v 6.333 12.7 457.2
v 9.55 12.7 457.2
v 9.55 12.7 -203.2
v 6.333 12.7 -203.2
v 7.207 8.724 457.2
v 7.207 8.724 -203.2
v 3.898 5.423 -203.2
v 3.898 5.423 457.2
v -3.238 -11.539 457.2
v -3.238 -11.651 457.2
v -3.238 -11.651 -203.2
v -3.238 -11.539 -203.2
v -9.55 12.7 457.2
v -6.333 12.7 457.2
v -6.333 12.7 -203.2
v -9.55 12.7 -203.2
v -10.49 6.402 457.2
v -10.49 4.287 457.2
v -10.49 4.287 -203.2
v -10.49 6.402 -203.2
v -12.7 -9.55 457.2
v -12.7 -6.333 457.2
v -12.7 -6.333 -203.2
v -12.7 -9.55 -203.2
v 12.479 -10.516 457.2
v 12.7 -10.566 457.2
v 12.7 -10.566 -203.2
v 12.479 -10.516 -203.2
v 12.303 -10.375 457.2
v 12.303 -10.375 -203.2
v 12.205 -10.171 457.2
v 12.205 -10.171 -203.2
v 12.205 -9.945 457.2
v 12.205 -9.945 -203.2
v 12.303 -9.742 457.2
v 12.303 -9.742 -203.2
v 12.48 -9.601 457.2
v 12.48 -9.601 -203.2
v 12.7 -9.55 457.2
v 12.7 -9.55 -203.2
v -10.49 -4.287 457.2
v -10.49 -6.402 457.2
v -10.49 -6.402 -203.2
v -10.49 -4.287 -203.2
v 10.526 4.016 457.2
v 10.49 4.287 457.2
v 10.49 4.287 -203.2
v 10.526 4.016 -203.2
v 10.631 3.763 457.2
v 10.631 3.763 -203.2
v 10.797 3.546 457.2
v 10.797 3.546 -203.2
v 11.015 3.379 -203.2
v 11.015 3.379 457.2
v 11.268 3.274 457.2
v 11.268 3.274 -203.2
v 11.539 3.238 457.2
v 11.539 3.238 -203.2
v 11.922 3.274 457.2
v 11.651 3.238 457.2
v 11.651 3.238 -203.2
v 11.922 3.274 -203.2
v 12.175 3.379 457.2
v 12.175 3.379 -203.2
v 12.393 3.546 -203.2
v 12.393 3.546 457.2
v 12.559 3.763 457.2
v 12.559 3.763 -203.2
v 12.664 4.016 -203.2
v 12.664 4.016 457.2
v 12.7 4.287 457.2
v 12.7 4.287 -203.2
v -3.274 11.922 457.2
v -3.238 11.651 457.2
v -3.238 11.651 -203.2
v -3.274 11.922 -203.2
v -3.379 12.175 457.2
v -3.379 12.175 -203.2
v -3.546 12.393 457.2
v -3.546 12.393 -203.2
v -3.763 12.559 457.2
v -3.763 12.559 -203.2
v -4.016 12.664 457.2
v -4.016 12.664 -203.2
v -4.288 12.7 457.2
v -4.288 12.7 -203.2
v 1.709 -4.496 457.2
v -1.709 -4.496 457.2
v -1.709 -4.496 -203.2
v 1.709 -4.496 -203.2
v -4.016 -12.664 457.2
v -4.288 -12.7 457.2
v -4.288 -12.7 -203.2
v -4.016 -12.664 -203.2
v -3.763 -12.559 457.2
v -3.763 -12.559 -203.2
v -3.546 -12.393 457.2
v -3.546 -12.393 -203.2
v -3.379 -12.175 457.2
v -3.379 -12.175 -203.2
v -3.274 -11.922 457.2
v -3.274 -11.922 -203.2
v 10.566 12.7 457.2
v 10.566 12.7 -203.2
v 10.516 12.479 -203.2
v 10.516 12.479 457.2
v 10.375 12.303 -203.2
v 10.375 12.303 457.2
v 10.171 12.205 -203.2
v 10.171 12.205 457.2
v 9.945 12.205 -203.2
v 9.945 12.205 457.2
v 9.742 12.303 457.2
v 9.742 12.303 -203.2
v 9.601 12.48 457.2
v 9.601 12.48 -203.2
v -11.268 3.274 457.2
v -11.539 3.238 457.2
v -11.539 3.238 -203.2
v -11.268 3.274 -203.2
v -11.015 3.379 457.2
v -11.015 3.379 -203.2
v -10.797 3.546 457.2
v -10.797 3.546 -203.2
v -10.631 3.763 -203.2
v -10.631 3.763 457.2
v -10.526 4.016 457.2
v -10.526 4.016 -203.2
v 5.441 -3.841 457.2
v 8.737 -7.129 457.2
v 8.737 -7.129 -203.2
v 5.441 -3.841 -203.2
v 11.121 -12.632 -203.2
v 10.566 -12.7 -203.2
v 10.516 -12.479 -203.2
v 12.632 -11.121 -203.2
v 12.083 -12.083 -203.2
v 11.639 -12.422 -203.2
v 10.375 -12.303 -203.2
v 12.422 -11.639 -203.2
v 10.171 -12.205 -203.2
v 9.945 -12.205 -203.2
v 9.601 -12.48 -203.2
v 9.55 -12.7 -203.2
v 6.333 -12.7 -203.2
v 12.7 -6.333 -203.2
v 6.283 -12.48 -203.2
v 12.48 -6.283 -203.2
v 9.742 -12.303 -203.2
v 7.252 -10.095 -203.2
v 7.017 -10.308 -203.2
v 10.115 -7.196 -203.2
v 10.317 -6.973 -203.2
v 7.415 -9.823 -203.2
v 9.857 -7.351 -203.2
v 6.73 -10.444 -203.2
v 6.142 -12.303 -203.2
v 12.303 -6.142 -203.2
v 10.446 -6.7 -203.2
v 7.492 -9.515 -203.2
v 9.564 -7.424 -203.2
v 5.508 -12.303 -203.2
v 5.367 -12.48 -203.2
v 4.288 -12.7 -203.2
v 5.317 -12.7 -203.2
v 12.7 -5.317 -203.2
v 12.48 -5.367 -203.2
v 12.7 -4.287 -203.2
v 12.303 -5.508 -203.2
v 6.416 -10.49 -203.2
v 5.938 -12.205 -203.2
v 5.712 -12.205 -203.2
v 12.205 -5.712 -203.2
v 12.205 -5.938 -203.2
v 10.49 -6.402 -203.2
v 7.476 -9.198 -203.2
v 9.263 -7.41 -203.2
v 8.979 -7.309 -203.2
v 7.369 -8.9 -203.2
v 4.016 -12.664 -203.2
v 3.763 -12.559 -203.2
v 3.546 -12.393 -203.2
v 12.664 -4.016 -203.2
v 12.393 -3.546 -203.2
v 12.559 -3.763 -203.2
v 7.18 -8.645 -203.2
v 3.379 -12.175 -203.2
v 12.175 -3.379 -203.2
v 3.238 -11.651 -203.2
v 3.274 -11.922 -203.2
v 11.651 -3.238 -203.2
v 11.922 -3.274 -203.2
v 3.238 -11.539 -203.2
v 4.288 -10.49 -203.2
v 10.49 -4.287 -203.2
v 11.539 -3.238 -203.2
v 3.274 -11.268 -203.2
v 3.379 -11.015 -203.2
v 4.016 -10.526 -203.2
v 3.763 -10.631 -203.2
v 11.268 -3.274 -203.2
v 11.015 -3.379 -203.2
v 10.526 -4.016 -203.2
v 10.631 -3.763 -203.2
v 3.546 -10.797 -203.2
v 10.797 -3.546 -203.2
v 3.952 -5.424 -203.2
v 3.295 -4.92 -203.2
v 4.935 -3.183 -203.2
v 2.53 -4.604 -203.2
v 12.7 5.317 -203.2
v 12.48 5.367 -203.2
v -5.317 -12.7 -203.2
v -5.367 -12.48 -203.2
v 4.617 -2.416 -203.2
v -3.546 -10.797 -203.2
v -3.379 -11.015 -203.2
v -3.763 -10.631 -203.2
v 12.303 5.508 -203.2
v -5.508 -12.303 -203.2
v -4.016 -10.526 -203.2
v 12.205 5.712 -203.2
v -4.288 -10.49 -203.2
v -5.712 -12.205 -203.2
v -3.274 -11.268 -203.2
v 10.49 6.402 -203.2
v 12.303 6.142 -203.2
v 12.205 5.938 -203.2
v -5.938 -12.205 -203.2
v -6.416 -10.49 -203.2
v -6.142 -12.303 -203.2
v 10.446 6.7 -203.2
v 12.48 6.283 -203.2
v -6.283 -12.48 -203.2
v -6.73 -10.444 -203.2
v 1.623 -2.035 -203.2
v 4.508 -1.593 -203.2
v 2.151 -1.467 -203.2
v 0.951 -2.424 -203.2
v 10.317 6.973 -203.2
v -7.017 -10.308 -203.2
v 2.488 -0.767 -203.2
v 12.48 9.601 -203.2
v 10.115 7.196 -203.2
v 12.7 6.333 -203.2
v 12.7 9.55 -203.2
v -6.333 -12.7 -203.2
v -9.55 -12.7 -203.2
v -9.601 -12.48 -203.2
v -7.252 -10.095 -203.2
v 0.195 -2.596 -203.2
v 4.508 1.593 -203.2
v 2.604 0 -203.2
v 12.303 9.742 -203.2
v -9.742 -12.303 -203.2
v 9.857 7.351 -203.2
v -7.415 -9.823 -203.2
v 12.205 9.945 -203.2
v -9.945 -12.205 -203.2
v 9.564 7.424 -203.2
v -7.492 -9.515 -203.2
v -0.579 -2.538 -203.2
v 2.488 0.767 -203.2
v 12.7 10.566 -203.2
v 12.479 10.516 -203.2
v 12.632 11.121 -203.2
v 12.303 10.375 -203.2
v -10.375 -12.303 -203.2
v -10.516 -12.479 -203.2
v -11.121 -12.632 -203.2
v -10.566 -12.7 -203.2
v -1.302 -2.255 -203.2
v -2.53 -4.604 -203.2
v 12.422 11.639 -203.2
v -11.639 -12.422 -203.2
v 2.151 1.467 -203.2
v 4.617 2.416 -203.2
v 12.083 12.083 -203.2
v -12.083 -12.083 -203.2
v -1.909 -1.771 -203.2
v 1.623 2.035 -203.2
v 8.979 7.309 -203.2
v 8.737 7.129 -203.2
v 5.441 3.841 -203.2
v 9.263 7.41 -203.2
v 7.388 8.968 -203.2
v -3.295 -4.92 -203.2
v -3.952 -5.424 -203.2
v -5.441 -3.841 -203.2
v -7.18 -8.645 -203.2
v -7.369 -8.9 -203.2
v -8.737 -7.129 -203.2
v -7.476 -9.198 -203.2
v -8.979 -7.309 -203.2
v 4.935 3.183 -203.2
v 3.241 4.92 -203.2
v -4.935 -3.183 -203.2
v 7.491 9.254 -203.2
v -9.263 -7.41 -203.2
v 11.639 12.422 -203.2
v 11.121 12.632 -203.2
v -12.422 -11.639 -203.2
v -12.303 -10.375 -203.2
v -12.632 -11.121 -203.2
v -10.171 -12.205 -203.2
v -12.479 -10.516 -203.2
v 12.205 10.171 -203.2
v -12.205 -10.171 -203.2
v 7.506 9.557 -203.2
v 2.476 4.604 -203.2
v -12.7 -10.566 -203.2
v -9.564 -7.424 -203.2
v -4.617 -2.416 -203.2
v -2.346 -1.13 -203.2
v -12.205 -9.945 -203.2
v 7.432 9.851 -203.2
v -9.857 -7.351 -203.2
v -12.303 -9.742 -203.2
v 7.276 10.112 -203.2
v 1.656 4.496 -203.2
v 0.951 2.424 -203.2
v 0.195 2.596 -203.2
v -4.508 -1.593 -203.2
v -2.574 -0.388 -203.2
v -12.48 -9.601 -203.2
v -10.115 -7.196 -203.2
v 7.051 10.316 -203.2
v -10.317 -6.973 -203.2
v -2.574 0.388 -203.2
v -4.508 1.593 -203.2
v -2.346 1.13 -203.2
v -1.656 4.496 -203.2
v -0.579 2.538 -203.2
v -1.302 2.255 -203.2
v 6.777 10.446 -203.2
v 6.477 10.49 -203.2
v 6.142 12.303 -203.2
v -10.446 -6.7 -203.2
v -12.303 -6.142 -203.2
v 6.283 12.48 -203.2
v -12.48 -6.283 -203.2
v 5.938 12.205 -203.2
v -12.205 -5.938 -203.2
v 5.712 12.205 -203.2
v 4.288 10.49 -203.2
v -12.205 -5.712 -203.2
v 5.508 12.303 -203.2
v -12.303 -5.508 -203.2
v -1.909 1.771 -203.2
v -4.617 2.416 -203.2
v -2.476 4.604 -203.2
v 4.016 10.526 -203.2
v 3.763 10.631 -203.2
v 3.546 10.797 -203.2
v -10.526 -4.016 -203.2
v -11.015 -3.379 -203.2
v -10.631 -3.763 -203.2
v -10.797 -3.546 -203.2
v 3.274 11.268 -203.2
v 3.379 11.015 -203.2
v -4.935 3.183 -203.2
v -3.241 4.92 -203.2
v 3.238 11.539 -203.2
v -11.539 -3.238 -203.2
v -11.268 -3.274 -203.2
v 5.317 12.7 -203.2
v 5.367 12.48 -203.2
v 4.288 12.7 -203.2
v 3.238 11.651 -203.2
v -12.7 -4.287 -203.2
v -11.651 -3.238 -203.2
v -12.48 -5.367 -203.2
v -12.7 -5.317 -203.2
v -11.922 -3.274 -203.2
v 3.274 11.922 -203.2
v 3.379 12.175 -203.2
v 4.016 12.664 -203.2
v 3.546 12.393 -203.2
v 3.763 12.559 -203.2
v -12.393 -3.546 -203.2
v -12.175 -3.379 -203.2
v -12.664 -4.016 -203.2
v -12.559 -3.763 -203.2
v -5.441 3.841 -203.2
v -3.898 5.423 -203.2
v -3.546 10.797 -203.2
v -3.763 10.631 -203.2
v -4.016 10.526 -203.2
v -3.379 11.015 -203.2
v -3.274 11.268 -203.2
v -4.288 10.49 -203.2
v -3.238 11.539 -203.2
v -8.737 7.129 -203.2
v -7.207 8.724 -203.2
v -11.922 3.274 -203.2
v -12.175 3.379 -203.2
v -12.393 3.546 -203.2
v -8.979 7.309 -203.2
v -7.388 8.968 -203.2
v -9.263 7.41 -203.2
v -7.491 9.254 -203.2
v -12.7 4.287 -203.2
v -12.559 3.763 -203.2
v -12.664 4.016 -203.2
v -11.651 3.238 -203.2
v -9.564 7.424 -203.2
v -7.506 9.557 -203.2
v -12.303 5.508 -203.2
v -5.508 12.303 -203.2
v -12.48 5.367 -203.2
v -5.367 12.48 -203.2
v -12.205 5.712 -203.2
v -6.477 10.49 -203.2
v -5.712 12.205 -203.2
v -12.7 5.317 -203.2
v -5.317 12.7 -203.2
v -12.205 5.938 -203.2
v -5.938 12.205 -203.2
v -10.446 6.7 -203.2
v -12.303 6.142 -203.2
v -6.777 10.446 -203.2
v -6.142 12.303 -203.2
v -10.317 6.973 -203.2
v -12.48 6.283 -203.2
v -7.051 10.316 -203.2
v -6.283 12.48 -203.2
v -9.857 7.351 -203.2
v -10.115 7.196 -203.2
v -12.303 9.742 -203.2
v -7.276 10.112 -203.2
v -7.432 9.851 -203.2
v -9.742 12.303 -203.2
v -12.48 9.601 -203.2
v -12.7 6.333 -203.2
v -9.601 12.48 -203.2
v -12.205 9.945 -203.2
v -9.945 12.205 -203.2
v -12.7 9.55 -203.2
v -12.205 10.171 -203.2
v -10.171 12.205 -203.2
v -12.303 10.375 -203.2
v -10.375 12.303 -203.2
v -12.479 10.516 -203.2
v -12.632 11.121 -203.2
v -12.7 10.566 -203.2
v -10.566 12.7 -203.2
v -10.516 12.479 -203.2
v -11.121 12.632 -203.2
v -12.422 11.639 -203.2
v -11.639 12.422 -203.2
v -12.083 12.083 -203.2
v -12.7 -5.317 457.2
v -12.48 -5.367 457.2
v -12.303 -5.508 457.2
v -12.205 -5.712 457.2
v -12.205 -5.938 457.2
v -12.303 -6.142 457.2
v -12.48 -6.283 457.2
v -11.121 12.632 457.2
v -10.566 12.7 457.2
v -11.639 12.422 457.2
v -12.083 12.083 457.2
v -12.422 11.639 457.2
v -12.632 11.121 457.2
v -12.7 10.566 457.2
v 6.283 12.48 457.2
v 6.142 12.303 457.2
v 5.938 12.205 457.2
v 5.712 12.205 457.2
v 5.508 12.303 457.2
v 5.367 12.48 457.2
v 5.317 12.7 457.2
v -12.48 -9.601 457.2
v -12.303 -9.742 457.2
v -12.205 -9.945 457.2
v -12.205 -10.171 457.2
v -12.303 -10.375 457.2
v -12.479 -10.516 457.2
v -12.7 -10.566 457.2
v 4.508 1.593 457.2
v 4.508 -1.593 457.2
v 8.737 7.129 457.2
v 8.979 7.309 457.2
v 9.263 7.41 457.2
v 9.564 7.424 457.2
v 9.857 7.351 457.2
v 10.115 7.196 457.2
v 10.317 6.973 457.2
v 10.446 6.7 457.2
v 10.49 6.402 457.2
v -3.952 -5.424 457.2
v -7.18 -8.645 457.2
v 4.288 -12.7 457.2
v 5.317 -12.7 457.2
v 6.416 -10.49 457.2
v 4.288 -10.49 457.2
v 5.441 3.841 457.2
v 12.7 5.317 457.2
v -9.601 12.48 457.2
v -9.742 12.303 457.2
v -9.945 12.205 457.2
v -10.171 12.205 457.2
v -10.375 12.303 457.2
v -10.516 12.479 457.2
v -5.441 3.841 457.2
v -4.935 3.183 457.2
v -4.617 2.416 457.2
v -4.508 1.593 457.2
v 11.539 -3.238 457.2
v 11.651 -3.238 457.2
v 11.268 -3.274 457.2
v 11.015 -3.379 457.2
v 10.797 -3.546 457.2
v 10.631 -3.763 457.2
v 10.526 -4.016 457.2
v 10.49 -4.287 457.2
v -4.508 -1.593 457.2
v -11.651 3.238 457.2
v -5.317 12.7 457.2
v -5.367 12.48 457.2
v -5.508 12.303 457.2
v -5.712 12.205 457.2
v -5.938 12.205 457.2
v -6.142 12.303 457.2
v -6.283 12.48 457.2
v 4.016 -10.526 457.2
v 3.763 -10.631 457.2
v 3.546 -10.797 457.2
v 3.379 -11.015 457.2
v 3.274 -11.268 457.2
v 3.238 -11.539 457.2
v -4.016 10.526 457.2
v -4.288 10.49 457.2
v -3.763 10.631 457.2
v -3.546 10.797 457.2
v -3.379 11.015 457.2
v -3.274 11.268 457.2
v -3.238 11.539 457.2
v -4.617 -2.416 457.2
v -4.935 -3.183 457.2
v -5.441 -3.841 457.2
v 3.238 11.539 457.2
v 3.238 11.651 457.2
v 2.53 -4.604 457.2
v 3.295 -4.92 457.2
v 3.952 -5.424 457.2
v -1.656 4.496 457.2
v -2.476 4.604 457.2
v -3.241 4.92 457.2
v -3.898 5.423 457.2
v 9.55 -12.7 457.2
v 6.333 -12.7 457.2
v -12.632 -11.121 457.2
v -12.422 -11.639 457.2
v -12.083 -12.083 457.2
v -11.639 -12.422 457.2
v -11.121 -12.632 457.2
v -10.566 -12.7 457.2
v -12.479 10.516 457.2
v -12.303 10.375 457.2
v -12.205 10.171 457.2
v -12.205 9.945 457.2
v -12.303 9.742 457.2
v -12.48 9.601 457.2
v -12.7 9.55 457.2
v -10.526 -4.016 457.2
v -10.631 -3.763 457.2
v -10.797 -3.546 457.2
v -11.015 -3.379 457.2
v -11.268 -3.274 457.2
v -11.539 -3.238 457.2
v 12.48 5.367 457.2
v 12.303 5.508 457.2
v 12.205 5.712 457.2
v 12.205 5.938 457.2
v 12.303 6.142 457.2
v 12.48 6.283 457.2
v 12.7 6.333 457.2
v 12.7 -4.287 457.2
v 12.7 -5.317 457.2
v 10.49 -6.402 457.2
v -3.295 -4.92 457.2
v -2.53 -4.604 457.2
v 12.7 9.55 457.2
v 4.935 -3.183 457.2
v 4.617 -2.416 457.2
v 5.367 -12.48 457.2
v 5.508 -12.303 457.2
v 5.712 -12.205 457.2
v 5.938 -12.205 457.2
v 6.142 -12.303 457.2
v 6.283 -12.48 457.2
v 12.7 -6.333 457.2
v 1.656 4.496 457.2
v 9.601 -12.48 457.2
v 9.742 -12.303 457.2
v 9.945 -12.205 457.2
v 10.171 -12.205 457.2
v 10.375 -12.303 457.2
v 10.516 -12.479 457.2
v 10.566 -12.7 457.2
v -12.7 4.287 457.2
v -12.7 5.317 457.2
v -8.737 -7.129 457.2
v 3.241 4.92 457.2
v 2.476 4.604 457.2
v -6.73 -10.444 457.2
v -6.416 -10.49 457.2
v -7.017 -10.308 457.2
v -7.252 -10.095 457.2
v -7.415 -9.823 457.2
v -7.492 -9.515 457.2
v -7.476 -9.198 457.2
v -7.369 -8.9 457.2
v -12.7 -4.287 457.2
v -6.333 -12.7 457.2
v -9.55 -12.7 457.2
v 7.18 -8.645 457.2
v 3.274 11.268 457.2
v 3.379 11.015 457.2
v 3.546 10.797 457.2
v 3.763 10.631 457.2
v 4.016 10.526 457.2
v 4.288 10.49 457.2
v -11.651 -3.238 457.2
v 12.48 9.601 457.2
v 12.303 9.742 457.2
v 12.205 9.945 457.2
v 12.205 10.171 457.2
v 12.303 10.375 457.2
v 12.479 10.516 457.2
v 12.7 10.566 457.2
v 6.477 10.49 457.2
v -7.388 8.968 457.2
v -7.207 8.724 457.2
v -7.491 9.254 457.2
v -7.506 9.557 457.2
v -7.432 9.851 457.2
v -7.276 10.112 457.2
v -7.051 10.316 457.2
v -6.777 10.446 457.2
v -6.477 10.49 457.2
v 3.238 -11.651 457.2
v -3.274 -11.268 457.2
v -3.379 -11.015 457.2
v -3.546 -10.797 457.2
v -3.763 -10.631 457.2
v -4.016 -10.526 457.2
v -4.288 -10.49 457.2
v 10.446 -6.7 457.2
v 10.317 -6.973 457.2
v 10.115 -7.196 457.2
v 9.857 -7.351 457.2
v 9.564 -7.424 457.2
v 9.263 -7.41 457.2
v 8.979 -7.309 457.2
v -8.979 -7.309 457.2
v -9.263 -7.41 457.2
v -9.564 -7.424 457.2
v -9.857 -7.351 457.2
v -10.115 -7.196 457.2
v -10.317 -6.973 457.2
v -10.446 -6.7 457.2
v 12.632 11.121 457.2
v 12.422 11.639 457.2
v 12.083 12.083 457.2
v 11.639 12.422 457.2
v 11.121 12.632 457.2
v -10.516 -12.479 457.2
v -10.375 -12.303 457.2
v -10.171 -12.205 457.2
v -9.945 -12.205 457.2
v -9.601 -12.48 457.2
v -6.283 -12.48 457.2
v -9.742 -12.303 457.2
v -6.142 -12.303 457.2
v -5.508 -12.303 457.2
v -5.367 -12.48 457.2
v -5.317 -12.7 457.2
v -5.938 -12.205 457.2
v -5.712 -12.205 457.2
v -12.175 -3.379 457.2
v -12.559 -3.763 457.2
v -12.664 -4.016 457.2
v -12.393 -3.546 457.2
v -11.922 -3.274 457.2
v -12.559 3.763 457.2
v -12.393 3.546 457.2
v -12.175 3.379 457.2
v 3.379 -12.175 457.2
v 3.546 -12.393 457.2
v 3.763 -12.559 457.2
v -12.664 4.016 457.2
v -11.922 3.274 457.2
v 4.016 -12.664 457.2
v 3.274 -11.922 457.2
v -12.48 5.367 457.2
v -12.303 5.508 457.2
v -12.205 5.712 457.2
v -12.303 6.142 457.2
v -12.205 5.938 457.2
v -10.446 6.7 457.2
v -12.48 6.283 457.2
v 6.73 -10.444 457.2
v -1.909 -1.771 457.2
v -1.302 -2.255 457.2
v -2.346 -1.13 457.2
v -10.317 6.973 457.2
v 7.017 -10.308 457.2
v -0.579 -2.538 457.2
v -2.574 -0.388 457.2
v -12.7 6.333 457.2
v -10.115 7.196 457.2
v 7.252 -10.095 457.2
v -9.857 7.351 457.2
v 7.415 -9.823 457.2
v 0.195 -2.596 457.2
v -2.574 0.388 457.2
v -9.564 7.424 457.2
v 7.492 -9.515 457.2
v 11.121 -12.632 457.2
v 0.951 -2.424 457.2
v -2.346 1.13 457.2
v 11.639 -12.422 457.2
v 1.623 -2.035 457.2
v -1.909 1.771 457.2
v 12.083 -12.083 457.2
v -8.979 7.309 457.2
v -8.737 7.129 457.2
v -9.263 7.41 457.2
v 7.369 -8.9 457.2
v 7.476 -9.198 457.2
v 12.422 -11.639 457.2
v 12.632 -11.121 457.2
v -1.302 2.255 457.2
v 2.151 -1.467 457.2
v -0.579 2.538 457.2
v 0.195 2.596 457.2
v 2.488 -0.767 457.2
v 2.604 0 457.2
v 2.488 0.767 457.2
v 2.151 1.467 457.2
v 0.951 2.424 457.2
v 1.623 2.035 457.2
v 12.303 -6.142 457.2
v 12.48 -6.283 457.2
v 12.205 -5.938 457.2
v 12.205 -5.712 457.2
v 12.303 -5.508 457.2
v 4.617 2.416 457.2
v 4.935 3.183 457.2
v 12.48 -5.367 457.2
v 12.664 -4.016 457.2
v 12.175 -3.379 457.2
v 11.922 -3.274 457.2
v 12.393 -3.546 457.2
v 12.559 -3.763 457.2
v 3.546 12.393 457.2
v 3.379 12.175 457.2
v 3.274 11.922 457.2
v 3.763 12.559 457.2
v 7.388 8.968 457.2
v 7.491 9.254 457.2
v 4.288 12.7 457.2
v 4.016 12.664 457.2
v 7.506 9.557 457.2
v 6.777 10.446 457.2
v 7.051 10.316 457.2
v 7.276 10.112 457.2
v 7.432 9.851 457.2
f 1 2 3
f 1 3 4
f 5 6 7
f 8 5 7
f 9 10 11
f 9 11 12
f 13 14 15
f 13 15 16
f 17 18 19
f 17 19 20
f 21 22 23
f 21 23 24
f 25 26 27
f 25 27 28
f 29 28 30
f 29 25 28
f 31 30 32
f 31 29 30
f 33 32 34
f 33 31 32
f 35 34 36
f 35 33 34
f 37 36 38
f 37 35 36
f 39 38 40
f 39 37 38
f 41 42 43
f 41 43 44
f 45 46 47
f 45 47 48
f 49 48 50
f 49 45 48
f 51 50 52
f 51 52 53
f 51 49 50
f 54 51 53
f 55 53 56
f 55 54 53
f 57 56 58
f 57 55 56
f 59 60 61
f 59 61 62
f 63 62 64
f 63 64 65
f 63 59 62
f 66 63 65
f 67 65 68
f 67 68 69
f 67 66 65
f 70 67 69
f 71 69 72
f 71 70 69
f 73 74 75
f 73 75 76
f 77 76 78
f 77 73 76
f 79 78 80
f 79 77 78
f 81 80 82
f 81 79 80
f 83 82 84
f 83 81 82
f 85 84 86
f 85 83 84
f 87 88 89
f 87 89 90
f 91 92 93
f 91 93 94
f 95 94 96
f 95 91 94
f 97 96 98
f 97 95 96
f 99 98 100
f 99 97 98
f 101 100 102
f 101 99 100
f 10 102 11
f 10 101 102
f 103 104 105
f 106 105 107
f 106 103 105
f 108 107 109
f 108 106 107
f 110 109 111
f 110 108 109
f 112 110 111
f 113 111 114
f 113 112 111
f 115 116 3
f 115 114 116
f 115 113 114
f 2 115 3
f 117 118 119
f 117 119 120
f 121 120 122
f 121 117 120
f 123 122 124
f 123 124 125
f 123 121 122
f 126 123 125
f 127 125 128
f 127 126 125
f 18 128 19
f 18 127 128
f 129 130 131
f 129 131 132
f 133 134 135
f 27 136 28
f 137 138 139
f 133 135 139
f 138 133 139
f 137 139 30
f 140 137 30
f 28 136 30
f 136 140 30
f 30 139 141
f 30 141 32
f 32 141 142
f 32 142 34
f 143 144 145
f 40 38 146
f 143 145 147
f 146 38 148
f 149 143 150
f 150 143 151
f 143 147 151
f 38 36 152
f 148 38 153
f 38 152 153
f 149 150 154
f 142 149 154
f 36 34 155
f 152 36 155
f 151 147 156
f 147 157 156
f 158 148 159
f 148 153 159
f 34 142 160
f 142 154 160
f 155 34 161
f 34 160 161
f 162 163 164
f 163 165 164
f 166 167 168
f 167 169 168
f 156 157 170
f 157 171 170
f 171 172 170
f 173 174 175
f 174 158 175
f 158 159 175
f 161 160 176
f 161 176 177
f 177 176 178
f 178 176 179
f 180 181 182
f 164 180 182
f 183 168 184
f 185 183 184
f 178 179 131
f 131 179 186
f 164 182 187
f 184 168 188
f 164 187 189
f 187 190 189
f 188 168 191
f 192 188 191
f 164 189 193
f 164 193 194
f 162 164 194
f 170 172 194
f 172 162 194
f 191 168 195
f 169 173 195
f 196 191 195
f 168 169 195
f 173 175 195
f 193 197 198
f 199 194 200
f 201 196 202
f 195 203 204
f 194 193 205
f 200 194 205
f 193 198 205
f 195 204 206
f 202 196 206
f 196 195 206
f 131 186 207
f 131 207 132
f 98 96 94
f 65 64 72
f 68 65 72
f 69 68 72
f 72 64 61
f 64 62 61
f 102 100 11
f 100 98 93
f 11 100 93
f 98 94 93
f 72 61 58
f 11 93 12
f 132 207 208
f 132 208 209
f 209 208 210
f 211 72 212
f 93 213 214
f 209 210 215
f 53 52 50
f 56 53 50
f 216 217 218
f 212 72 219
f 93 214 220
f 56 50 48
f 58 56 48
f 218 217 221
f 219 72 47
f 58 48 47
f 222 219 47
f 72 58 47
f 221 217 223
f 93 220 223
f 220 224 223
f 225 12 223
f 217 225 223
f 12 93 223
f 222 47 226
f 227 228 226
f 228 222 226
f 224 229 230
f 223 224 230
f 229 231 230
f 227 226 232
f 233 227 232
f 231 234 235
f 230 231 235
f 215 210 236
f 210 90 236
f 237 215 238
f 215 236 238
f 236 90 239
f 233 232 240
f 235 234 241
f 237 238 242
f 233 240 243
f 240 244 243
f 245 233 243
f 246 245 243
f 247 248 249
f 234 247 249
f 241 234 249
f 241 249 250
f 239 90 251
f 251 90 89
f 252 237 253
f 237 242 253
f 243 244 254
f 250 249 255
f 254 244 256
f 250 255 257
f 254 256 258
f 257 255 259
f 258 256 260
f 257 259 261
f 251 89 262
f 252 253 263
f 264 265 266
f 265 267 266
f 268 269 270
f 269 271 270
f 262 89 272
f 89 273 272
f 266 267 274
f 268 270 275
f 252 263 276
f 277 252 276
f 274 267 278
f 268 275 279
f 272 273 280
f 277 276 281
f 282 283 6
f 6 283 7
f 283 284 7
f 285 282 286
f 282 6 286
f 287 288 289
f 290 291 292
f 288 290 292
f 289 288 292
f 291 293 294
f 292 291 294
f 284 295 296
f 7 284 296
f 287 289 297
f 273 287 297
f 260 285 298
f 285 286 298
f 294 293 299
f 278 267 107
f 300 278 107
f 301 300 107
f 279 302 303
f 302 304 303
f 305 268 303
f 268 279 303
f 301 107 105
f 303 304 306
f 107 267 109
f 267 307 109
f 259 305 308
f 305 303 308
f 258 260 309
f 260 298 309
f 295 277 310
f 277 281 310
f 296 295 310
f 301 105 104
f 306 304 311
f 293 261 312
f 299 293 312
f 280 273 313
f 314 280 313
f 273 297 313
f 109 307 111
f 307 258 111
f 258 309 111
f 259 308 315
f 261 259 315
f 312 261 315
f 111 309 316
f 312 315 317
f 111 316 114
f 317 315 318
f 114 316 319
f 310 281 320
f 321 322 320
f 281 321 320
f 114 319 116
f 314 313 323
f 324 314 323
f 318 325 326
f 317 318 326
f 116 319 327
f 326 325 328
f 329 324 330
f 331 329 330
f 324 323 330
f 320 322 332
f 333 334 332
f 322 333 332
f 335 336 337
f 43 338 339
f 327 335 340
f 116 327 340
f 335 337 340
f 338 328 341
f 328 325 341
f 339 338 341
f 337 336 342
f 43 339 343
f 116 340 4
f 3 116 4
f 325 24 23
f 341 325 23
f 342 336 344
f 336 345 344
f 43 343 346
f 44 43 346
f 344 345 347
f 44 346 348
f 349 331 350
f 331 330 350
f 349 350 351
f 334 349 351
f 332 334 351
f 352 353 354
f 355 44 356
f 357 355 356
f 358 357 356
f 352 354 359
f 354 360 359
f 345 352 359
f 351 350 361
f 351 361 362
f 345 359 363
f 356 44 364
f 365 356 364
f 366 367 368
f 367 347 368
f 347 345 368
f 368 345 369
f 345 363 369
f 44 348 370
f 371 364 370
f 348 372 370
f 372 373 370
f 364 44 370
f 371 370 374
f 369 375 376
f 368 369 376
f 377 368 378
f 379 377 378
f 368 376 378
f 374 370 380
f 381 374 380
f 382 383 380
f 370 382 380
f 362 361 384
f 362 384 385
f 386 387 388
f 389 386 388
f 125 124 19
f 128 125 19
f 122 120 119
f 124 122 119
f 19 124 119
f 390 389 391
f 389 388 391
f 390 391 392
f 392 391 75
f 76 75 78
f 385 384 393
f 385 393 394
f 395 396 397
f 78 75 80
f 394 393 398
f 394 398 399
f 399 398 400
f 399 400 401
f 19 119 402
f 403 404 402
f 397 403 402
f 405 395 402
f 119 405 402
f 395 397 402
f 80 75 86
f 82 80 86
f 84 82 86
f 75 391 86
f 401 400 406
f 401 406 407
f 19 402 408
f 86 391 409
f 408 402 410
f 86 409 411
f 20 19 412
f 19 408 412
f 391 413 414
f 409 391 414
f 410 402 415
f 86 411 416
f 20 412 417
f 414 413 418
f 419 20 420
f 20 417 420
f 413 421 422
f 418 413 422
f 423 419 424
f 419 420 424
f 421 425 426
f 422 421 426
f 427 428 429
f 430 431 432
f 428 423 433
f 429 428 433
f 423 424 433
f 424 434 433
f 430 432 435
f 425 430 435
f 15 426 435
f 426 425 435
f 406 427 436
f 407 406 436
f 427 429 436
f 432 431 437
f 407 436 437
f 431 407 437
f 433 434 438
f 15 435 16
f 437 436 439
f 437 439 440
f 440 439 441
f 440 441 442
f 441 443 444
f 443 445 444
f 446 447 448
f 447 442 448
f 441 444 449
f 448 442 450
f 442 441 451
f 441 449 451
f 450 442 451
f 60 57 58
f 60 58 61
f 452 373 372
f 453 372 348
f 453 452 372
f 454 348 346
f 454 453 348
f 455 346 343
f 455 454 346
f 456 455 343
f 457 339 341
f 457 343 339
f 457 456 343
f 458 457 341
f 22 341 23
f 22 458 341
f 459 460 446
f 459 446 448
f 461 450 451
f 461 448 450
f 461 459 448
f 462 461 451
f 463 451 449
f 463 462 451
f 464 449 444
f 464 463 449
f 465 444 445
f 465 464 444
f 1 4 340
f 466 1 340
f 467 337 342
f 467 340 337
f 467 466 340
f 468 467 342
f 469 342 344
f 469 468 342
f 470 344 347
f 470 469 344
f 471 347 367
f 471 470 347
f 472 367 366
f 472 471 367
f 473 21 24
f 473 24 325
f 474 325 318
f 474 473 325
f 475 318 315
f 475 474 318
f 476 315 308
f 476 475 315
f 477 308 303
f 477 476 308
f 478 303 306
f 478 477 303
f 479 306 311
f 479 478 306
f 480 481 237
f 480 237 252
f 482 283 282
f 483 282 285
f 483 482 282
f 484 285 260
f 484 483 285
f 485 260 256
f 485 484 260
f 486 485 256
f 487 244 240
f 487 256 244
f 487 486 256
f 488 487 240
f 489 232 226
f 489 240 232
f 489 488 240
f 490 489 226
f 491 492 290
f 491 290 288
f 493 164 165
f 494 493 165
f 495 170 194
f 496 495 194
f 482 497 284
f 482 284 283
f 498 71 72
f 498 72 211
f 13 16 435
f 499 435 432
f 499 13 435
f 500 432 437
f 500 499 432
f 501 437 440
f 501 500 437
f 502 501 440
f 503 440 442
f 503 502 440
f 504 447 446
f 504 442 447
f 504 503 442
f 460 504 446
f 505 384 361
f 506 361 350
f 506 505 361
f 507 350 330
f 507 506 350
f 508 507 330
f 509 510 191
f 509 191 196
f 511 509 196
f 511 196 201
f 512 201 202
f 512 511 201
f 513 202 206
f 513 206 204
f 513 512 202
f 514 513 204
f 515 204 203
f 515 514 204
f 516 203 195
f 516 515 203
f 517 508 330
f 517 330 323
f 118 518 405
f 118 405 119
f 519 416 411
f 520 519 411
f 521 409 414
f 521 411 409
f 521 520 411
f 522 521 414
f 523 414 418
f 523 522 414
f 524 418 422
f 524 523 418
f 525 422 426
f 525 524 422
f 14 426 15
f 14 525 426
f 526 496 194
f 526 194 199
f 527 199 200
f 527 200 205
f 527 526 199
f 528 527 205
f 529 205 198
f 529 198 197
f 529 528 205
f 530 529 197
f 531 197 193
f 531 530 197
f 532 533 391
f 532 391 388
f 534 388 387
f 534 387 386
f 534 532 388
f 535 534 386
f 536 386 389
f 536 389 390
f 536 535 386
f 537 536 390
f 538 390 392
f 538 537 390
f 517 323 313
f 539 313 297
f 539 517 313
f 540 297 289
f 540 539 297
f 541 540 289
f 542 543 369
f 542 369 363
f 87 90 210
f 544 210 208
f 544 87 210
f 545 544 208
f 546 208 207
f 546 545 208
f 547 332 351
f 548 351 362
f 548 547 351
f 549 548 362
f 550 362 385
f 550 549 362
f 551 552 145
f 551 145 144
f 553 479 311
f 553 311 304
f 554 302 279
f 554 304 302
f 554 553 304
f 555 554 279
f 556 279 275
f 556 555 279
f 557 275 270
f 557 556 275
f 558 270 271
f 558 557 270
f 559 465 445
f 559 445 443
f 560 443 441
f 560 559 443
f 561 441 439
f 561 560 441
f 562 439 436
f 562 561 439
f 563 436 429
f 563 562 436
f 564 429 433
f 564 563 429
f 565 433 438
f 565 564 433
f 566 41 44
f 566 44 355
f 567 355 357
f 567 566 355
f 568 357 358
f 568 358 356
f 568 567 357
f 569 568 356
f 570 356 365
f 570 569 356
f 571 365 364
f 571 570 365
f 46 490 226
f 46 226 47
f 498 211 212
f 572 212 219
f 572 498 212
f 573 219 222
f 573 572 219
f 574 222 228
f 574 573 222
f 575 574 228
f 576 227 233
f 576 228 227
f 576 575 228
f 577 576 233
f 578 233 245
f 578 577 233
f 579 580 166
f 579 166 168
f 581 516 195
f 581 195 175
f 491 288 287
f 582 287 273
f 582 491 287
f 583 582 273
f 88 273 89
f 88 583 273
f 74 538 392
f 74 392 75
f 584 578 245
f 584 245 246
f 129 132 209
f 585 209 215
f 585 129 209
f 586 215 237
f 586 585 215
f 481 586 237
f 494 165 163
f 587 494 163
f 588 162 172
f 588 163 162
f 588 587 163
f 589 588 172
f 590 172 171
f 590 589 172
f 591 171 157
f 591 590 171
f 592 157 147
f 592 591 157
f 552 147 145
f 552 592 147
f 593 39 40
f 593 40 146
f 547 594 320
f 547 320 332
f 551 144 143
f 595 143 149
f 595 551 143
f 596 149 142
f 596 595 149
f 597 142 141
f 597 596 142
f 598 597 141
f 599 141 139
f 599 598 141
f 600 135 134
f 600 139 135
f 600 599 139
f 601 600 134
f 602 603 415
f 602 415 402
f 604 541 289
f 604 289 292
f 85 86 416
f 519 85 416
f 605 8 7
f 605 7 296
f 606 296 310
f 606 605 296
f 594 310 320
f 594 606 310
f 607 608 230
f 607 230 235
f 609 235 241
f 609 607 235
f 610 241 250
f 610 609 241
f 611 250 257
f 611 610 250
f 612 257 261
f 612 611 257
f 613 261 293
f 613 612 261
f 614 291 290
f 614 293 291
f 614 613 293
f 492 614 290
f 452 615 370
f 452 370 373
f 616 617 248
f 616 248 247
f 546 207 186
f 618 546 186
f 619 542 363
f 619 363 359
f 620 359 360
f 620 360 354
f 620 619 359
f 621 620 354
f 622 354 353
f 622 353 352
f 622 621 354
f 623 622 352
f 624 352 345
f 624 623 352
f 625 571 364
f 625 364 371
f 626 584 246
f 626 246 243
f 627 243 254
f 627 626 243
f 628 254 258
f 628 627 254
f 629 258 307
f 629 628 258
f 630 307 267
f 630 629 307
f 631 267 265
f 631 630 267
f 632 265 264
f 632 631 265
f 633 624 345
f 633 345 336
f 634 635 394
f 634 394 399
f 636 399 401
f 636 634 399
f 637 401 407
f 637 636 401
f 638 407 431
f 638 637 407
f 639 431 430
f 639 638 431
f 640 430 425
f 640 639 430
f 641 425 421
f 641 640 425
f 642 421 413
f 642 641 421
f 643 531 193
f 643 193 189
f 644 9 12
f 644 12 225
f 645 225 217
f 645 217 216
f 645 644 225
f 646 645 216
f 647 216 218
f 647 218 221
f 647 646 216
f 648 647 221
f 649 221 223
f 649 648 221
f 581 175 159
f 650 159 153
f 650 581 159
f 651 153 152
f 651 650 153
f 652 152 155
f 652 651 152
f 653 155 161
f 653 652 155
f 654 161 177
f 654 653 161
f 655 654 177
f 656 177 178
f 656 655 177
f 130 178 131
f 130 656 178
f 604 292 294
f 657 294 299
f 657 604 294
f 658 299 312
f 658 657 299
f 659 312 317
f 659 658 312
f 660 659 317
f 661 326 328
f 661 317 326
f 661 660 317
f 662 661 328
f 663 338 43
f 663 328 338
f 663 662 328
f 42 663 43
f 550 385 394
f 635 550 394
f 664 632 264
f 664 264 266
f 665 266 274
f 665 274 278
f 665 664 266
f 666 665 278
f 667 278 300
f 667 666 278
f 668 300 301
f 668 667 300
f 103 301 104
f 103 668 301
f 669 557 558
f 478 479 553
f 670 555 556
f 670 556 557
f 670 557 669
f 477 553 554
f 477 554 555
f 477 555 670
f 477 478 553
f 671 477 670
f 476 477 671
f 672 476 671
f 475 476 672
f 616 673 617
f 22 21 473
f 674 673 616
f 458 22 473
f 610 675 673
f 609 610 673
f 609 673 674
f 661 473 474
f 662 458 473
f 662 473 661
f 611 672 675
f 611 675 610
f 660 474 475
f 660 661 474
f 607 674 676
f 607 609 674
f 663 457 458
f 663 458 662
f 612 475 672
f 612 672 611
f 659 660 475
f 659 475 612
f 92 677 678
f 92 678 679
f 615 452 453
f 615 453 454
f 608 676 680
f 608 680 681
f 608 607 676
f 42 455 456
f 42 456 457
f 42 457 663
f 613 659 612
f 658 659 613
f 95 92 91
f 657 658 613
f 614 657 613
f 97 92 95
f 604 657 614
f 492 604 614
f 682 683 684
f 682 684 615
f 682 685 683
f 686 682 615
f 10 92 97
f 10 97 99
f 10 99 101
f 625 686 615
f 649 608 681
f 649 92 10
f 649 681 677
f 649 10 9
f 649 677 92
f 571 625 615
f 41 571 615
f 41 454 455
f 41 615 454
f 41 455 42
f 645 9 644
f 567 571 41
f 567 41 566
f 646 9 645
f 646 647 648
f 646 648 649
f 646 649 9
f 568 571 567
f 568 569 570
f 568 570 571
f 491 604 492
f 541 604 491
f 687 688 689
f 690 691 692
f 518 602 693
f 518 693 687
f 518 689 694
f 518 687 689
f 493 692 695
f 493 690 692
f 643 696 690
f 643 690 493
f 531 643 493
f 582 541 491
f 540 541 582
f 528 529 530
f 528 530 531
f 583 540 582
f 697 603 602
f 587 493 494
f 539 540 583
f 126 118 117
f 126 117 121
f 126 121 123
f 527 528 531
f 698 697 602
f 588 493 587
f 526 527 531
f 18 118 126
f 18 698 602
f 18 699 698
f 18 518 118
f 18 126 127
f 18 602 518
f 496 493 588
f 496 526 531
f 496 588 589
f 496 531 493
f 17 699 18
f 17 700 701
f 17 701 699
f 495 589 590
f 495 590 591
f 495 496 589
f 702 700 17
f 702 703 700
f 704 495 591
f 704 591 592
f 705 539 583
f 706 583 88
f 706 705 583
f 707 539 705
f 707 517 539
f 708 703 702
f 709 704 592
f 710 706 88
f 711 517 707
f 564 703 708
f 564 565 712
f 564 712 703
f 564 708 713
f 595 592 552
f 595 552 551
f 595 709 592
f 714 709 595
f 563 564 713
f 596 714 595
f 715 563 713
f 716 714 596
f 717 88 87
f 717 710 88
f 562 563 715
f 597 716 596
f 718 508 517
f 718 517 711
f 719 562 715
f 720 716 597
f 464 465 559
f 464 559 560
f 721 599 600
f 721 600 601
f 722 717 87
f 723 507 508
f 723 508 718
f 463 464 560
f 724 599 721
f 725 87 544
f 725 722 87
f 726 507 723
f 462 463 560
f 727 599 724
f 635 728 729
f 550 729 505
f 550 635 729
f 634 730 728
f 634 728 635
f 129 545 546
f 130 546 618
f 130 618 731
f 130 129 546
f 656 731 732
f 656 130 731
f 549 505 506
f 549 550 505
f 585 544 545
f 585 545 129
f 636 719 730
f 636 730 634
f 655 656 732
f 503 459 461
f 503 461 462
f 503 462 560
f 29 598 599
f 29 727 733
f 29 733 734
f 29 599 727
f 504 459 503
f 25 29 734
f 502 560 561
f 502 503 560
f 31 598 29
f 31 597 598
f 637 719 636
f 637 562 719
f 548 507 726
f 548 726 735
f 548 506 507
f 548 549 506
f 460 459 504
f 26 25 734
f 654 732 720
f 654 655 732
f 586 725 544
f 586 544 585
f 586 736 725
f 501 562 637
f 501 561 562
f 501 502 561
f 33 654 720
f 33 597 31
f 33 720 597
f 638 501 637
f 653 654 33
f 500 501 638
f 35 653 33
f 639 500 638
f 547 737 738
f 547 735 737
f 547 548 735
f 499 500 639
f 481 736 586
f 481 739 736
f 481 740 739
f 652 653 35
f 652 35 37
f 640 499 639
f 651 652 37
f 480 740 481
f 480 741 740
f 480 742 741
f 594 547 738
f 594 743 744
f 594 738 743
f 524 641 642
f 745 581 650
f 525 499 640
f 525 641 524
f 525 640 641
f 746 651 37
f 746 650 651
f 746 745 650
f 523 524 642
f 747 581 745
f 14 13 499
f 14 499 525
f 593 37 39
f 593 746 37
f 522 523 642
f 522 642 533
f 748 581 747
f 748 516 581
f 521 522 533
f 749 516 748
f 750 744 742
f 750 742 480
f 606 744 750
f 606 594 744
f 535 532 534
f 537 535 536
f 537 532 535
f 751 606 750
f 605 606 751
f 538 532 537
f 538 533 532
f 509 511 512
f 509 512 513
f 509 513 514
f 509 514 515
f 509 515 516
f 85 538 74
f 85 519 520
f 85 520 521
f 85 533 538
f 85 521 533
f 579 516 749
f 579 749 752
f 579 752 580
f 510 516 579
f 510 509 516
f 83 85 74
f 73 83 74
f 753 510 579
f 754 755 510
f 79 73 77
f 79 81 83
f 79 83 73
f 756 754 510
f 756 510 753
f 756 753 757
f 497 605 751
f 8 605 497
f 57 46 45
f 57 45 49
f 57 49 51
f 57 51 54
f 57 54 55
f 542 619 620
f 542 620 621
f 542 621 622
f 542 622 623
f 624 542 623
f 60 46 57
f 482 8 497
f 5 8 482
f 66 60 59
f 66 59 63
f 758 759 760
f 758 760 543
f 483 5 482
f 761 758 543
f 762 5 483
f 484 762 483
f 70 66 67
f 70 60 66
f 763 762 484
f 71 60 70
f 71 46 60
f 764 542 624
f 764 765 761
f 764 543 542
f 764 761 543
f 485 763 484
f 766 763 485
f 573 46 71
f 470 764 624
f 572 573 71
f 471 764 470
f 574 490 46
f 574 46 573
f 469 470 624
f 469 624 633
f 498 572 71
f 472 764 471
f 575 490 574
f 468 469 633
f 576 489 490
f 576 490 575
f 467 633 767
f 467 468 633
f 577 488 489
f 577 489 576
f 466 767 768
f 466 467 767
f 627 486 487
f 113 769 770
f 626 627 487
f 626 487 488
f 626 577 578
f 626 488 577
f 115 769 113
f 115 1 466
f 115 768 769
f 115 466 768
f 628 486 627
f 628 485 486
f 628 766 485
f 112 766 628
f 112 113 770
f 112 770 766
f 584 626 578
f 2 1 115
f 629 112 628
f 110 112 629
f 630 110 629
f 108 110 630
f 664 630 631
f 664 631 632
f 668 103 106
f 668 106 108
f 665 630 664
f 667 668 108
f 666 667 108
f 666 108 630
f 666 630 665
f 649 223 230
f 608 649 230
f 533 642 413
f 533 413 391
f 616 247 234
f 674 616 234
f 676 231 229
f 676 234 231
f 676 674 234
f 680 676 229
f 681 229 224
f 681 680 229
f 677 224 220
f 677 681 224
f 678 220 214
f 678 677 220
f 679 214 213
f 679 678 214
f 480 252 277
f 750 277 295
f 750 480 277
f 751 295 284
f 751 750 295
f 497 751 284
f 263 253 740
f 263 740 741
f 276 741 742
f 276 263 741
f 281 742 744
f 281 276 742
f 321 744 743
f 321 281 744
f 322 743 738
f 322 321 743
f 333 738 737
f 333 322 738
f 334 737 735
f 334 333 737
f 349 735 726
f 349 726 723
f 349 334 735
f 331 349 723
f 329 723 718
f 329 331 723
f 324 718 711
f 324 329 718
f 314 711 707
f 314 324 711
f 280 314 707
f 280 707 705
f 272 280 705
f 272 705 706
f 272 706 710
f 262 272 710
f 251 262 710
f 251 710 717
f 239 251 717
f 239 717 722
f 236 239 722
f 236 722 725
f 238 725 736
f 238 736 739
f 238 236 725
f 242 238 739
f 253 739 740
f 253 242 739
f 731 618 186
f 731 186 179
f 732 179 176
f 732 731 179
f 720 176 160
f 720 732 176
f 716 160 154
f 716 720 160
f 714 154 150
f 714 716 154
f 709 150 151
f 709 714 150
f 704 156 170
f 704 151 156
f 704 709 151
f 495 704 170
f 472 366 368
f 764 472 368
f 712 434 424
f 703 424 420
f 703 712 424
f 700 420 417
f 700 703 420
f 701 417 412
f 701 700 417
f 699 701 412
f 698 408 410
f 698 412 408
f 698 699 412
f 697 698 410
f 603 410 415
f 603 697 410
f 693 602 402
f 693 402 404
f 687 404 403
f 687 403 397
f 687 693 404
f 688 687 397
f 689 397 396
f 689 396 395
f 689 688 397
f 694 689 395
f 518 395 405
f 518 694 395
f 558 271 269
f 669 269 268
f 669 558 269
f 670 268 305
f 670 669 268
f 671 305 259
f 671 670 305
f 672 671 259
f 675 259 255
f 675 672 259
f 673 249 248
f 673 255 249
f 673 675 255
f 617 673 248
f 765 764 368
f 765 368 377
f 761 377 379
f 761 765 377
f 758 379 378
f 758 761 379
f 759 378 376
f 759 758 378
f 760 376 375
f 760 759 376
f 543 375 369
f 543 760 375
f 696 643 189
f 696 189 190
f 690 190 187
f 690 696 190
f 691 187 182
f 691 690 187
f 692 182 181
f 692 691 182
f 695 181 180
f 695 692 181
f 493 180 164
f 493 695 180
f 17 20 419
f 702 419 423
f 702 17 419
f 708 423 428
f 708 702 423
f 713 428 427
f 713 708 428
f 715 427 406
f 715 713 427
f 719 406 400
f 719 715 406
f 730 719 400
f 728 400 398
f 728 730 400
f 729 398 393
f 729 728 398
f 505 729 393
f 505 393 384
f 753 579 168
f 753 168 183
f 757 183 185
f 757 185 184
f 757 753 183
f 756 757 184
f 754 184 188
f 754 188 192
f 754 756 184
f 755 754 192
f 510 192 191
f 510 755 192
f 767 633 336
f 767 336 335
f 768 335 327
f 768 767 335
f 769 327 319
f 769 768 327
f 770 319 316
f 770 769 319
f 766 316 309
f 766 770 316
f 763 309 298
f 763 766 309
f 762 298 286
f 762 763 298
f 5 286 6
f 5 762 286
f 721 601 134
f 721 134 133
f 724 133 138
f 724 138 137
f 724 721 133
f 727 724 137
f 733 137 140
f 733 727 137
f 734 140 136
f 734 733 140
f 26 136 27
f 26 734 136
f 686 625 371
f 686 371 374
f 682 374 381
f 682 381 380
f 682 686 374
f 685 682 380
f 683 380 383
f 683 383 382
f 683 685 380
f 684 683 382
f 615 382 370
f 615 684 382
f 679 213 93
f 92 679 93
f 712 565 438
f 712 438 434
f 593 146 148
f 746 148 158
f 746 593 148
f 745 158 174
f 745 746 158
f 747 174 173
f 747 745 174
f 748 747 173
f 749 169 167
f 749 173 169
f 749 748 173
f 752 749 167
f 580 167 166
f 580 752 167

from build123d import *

# Parameters (mm, degrees)
SKETCH1_R               = 2.6035
BOSS_EXTRUDE1_DEPTH     = 457.2
CUT_EXTRUDE2_DEPTH      = 4.318
CUT_EXTRUDE2_DEPTH_BACK = 26.924


with BuildPart() as part:
    # Sketch1 → Boss-Extrude1 (new body, symmetric)
    with BuildSketch(Plane.XY):
        with BuildLine():
            Line((-7.179650497, -8.645192506), (-3.952270251, -5.423690499))
            ThreePointArc((-3.952270251, -5.423690499), (-2.922936451, -4.736929036), (-1.709253557, -4.4958))
            Line((-1.709253557, -4.4958), (1.709253557, -4.4958))
            ThreePointArc((1.709253557, -4.4958), (2.922936451, -4.736929036), (3.952270251, -5.423690499))
            Line((3.952270251, -5.423690499), (7.179650497, -8.645192506))
            ThreePointArc((7.179650497, -8.645192506), (7.41473083, -9.822813117), (6.416408329, -10.4902))
            Line((6.416408329, -10.4902), (4.287512407, -10.4902))
            ThreePointArc((4.287512407, -10.4902), (3.54574862, -10.79744862), (3.2385, -11.539212407))
            Line((3.2385, -11.539212407), (3.2385, -11.650987593))
            ThreePointArc((3.2385, -11.650987593), (3.54574862, -12.39275138), (4.287512407, -12.7))
            Line((4.287512407, -12.7), (5.317126718, -12.7))
            ThreePointArc((5.317126718, -12.7), (5.825126718, -12.192), (6.333126718, -12.7))
            Line((6.333126718, -12.7), (9.550443118, -12.7))
            ThreePointArc((9.550443118, -12.7), (10.058366869, -12.192000006), (10.566443095, -12.699847501))
            ThreePointArc((10.566443095, -12.699847501), (12.082537762, -12.08250727), (12.699846982, -10.566399977))
            ThreePointArc((12.699846982, -10.566399977), (12.192000006, -10.058323491), (12.7, -9.5504))
            Line((12.7, -9.5504), (12.7, -6.3330836))
            ThreePointArc((12.7, -6.3330836), (12.192, -5.8250836), (12.7, -5.3170836))
            Line((12.7, -5.3170836), (12.7, -4.287469289))
            ThreePointArc((12.7, -4.287469289), (12.39275138, -3.545705502), (11.650987593, -3.238456882))
            Line((11.650987593, -3.238456882), (11.539212407, -3.238456882))
            ThreePointArc((11.539212407, -3.238456882), (10.79744862, -3.545705502), (10.4902, -4.287469289))
            Line((10.4902, -4.287469289), (10.4902, -6.402089023))
            ThreePointArc((10.4902, -6.402089023), (9.856505071, -7.351067942), (8.737131347, -7.129408934))
            Line((8.737131347, -7.129408934), (5.441005833, -3.840816462))
            ThreePointArc((5.441005833, -3.840816462), (4.750877967, -2.809883091), (4.5085, -1.593185507))
            Line((4.5085, -1.593185507), (4.5085, 1.593185507))
            ThreePointArc((4.5085, 1.593185507), (4.750877967, 2.809883091), (5.441005833, 3.840816462))
            Line((5.441005833, 3.840816462), (8.737131347, 7.129408934))
            ThreePointArc((8.737131347, 7.129408934), (9.856505071, 7.351067942), (10.4902, 6.402089023))
            Line((10.4902, 6.402089023), (10.4902, 4.287469289))
            ThreePointArc((10.4902, 4.287469289), (10.79744862, 3.545705502), (11.539212407, 3.238456882))
            Line((11.539212407, 3.238456882), (11.650987593, 3.238456882))
            ThreePointArc((11.650987593, 3.238456882), (12.39275138, 3.545705502), (12.7, 4.287469289))
            Line((12.7, 4.287469289), (12.7, 5.3170836))
            ThreePointArc((12.7, 5.3170836), (12.192, 5.8250836), (12.7, 6.3330836))
            Line((12.7, 6.3330836), (12.7, 9.5504))
            ThreePointArc((12.7, 9.5504), (12.192000006, 10.058323491), (12.699846982, 10.566399977))
            ThreePointArc((12.699846982, 10.566399977), (12.082537762, 12.08250727), (10.566443095, 12.699847501))
            ThreePointArc((10.566443095, 12.699847501), (10.058366869, 12.192000006), (9.550443118, 12.7))
            Line((9.550443118, 12.7), (6.333126718, 12.7))
            ThreePointArc((6.333126718, 12.7), (5.825126718, 12.192), (5.317126718, 12.7))
            Line((5.317126718, 12.7), (4.287512407, 12.7))
            ThreePointArc((4.287512407, 12.7), (3.54574862, 12.39275138), (3.2385, 11.650987593))
            Line((3.2385, 11.650987593), (3.2385, 11.539212407))
            ThreePointArc((3.2385, 11.539212407), (3.54574862, 10.79744862), (4.287512407, 10.4902))
            Line((4.287512407, 10.4902), (6.476788598, 10.4902))
            ThreePointArc((6.476788598, 10.4902), (7.432222385, 9.85140422), (7.207036008, 8.724370562))
            Line((7.207036008, 8.724370562), (3.898272566, 5.423169045))
            ThreePointArc((3.898272566, 5.423169045), (2.869120213, 4.736787962), (1.655778399, 4.4958))
            Line((1.655778399, 4.4958), (-1.655778399, 4.4958))
            ThreePointArc((-1.655778399, 4.4958), (-2.869120213, 4.736787962), (-3.898272566, 5.423169045))
            Line((-3.898272566, 5.423169045), (-7.207036008, 8.724370562))
            ThreePointArc((-7.207036008, 8.724370562), (-7.432222385, 9.85140422), (-6.476788598, 10.4902))
            Line((-6.476788598, 10.4902), (-4.287512407, 10.4902))
            ThreePointArc((-4.287512407, 10.4902), (-3.54574862, 10.79744862), (-3.2385, 11.539212407))
            Line((-3.2385, 11.539212407), (-3.2385, 11.650987593))
            ThreePointArc((-3.2385, 11.650987593), (-3.54574862, 12.39275138), (-4.287512407, 12.7))
            Line((-4.287512407, 12.7), (-5.317126718, 12.7))
            ThreePointArc((-5.317126718, 12.7), (-5.825126718, 12.192), (-6.333126718, 12.7))
            Line((-6.333126718, 12.7), (-9.550443118, 12.7))
            ThreePointArc((-9.550443118, 12.7), (-10.058366869, 12.192000006), (-10.566443095, 12.699847501))
            ThreePointArc((-10.566443095, 12.699847501), (-12.082537762, 12.08250727), (-12.699846982, 10.566399977))
            ThreePointArc((-12.699846982, 10.566399977), (-12.192000006, 10.058323491), (-12.7, 9.5504))
            Line((-12.7, 9.5504), (-12.7, 6.3330836))
            ThreePointArc((-12.7, 6.3330836), (-12.192, 5.8250836), (-12.7, 5.3170836))
            Line((-12.7, 5.3170836), (-12.7, 4.287469289))
            ThreePointArc((-12.7, 4.287469289), (-12.39275138, 3.545705502), (-11.650987593, 3.238456882))
            Line((-11.650987593, 3.238456882), (-11.539212407, 3.238456882))
            ThreePointArc((-11.539212407, 3.238456882), (-10.79744862, 3.545705502), (-10.4902, 4.287469289))
            Line((-10.4902, 4.287469289), (-10.4902, 6.402089023))
            ThreePointArc((-10.4902, 6.402089023), (-9.856505071, 7.351067942), (-8.737131347, 7.129408934))
            Line((-8.737131347, 7.129408934), (-5.441005833, 3.840816462))
            ThreePointArc((-5.441005833, 3.840816462), (-4.750877967, 2.809883091), (-4.5085, 1.593185507))
            Line((-4.5085, 1.593185507), (-4.5085, -1.593185507))
            ThreePointArc((-4.5085, -1.593185507), (-4.750877967, -2.809883091), (-5.441005833, -3.840816462))
            Line((-5.441005833, -3.840816462), (-8.737131347, -7.129408934))
            ThreePointArc((-8.737131347, -7.129408934), (-9.856505071, -7.351067942), (-10.4902, -6.402089023))
            Line((-10.4902, -6.402089023), (-10.4902, -4.287469289))
            ThreePointArc((-10.4902, -4.287469289), (-10.79744862, -3.545705502), (-11.539212407, -3.238456882))
            Line((-11.539212407, -3.238456882), (-11.650987593, -3.238456882))
            ThreePointArc((-11.650987593, -3.238456882), (-12.39275138, -3.545705502), (-12.7, -4.287469289))
            Line((-12.7, -4.287469289), (-12.7, -5.3170836))
            ThreePointArc((-12.7, -5.3170836), (-12.192, -5.8250836), (-12.7, -6.3330836))
            Line((-12.7, -6.3330836), (-12.7, -9.5504))
            ThreePointArc((-12.7, -9.5504), (-12.192000006, -10.058323491), (-12.699846982, -10.566399977))
            ThreePointArc((-12.699846982, -10.566399977), (-12.082537762, -12.08250727), (-10.566443095, -12.699847501))
            ThreePointArc((-10.566443095, -12.699847501), (-10.058366869, -12.192000006), (-9.550443118, -12.7))
            Line((-9.550443118, -12.7), (-6.333126718, -12.7))
            ThreePointArc((-6.333126718, -12.7), (-5.825126718, -12.192), (-5.317126718, -12.7))
            Line((-5.317126718, -12.7), (-4.287512407, -12.7))
            ThreePointArc((-4.287512407, -12.7), (-3.54574862, -12.39275138), (-3.2385, -11.650987593))
            Line((-3.2385, -11.650987593), (-3.2385, -11.539212407))
            ThreePointArc((-3.2385, -11.539212407), (-3.54574862, -10.79744862), (-4.287512407, -10.4902))
            Line((-4.287512407, -10.4902), (-6.416408329, -10.4902))
            ThreePointArc((-6.416408329, -10.4902), (-7.41473083, -9.822813117), (-7.179650497, -8.645192506))
        make_face()
        Circle(SKETCH1_R, mode=Mode.SUBTRACT)
    extrude(amount=BOSS_EXTRUDE1_DEPTH, both=True)

    # Sketch3 → Cut-Extrude2 (cut, two sides)
    with BuildSketch(Plane.ZY.offset(12.7)) as cut_extrude2_sk:
        Polygon((-203.2, -27.552777595), (-203.2, 21.158109763), (-461.090893327, 21.158109763), (-461.090893327, -25.4), align=None)
    extrude(amount=CUT_EXTRUDE2_DEPTH, mode=Mode.SUBTRACT)
    extrude(cut_extrude2_sk.sketch, amount=-CUT_EXTRUDE2_DEPTH_BACK, mode=Mode.SUBTRACT)


solid = part.part
